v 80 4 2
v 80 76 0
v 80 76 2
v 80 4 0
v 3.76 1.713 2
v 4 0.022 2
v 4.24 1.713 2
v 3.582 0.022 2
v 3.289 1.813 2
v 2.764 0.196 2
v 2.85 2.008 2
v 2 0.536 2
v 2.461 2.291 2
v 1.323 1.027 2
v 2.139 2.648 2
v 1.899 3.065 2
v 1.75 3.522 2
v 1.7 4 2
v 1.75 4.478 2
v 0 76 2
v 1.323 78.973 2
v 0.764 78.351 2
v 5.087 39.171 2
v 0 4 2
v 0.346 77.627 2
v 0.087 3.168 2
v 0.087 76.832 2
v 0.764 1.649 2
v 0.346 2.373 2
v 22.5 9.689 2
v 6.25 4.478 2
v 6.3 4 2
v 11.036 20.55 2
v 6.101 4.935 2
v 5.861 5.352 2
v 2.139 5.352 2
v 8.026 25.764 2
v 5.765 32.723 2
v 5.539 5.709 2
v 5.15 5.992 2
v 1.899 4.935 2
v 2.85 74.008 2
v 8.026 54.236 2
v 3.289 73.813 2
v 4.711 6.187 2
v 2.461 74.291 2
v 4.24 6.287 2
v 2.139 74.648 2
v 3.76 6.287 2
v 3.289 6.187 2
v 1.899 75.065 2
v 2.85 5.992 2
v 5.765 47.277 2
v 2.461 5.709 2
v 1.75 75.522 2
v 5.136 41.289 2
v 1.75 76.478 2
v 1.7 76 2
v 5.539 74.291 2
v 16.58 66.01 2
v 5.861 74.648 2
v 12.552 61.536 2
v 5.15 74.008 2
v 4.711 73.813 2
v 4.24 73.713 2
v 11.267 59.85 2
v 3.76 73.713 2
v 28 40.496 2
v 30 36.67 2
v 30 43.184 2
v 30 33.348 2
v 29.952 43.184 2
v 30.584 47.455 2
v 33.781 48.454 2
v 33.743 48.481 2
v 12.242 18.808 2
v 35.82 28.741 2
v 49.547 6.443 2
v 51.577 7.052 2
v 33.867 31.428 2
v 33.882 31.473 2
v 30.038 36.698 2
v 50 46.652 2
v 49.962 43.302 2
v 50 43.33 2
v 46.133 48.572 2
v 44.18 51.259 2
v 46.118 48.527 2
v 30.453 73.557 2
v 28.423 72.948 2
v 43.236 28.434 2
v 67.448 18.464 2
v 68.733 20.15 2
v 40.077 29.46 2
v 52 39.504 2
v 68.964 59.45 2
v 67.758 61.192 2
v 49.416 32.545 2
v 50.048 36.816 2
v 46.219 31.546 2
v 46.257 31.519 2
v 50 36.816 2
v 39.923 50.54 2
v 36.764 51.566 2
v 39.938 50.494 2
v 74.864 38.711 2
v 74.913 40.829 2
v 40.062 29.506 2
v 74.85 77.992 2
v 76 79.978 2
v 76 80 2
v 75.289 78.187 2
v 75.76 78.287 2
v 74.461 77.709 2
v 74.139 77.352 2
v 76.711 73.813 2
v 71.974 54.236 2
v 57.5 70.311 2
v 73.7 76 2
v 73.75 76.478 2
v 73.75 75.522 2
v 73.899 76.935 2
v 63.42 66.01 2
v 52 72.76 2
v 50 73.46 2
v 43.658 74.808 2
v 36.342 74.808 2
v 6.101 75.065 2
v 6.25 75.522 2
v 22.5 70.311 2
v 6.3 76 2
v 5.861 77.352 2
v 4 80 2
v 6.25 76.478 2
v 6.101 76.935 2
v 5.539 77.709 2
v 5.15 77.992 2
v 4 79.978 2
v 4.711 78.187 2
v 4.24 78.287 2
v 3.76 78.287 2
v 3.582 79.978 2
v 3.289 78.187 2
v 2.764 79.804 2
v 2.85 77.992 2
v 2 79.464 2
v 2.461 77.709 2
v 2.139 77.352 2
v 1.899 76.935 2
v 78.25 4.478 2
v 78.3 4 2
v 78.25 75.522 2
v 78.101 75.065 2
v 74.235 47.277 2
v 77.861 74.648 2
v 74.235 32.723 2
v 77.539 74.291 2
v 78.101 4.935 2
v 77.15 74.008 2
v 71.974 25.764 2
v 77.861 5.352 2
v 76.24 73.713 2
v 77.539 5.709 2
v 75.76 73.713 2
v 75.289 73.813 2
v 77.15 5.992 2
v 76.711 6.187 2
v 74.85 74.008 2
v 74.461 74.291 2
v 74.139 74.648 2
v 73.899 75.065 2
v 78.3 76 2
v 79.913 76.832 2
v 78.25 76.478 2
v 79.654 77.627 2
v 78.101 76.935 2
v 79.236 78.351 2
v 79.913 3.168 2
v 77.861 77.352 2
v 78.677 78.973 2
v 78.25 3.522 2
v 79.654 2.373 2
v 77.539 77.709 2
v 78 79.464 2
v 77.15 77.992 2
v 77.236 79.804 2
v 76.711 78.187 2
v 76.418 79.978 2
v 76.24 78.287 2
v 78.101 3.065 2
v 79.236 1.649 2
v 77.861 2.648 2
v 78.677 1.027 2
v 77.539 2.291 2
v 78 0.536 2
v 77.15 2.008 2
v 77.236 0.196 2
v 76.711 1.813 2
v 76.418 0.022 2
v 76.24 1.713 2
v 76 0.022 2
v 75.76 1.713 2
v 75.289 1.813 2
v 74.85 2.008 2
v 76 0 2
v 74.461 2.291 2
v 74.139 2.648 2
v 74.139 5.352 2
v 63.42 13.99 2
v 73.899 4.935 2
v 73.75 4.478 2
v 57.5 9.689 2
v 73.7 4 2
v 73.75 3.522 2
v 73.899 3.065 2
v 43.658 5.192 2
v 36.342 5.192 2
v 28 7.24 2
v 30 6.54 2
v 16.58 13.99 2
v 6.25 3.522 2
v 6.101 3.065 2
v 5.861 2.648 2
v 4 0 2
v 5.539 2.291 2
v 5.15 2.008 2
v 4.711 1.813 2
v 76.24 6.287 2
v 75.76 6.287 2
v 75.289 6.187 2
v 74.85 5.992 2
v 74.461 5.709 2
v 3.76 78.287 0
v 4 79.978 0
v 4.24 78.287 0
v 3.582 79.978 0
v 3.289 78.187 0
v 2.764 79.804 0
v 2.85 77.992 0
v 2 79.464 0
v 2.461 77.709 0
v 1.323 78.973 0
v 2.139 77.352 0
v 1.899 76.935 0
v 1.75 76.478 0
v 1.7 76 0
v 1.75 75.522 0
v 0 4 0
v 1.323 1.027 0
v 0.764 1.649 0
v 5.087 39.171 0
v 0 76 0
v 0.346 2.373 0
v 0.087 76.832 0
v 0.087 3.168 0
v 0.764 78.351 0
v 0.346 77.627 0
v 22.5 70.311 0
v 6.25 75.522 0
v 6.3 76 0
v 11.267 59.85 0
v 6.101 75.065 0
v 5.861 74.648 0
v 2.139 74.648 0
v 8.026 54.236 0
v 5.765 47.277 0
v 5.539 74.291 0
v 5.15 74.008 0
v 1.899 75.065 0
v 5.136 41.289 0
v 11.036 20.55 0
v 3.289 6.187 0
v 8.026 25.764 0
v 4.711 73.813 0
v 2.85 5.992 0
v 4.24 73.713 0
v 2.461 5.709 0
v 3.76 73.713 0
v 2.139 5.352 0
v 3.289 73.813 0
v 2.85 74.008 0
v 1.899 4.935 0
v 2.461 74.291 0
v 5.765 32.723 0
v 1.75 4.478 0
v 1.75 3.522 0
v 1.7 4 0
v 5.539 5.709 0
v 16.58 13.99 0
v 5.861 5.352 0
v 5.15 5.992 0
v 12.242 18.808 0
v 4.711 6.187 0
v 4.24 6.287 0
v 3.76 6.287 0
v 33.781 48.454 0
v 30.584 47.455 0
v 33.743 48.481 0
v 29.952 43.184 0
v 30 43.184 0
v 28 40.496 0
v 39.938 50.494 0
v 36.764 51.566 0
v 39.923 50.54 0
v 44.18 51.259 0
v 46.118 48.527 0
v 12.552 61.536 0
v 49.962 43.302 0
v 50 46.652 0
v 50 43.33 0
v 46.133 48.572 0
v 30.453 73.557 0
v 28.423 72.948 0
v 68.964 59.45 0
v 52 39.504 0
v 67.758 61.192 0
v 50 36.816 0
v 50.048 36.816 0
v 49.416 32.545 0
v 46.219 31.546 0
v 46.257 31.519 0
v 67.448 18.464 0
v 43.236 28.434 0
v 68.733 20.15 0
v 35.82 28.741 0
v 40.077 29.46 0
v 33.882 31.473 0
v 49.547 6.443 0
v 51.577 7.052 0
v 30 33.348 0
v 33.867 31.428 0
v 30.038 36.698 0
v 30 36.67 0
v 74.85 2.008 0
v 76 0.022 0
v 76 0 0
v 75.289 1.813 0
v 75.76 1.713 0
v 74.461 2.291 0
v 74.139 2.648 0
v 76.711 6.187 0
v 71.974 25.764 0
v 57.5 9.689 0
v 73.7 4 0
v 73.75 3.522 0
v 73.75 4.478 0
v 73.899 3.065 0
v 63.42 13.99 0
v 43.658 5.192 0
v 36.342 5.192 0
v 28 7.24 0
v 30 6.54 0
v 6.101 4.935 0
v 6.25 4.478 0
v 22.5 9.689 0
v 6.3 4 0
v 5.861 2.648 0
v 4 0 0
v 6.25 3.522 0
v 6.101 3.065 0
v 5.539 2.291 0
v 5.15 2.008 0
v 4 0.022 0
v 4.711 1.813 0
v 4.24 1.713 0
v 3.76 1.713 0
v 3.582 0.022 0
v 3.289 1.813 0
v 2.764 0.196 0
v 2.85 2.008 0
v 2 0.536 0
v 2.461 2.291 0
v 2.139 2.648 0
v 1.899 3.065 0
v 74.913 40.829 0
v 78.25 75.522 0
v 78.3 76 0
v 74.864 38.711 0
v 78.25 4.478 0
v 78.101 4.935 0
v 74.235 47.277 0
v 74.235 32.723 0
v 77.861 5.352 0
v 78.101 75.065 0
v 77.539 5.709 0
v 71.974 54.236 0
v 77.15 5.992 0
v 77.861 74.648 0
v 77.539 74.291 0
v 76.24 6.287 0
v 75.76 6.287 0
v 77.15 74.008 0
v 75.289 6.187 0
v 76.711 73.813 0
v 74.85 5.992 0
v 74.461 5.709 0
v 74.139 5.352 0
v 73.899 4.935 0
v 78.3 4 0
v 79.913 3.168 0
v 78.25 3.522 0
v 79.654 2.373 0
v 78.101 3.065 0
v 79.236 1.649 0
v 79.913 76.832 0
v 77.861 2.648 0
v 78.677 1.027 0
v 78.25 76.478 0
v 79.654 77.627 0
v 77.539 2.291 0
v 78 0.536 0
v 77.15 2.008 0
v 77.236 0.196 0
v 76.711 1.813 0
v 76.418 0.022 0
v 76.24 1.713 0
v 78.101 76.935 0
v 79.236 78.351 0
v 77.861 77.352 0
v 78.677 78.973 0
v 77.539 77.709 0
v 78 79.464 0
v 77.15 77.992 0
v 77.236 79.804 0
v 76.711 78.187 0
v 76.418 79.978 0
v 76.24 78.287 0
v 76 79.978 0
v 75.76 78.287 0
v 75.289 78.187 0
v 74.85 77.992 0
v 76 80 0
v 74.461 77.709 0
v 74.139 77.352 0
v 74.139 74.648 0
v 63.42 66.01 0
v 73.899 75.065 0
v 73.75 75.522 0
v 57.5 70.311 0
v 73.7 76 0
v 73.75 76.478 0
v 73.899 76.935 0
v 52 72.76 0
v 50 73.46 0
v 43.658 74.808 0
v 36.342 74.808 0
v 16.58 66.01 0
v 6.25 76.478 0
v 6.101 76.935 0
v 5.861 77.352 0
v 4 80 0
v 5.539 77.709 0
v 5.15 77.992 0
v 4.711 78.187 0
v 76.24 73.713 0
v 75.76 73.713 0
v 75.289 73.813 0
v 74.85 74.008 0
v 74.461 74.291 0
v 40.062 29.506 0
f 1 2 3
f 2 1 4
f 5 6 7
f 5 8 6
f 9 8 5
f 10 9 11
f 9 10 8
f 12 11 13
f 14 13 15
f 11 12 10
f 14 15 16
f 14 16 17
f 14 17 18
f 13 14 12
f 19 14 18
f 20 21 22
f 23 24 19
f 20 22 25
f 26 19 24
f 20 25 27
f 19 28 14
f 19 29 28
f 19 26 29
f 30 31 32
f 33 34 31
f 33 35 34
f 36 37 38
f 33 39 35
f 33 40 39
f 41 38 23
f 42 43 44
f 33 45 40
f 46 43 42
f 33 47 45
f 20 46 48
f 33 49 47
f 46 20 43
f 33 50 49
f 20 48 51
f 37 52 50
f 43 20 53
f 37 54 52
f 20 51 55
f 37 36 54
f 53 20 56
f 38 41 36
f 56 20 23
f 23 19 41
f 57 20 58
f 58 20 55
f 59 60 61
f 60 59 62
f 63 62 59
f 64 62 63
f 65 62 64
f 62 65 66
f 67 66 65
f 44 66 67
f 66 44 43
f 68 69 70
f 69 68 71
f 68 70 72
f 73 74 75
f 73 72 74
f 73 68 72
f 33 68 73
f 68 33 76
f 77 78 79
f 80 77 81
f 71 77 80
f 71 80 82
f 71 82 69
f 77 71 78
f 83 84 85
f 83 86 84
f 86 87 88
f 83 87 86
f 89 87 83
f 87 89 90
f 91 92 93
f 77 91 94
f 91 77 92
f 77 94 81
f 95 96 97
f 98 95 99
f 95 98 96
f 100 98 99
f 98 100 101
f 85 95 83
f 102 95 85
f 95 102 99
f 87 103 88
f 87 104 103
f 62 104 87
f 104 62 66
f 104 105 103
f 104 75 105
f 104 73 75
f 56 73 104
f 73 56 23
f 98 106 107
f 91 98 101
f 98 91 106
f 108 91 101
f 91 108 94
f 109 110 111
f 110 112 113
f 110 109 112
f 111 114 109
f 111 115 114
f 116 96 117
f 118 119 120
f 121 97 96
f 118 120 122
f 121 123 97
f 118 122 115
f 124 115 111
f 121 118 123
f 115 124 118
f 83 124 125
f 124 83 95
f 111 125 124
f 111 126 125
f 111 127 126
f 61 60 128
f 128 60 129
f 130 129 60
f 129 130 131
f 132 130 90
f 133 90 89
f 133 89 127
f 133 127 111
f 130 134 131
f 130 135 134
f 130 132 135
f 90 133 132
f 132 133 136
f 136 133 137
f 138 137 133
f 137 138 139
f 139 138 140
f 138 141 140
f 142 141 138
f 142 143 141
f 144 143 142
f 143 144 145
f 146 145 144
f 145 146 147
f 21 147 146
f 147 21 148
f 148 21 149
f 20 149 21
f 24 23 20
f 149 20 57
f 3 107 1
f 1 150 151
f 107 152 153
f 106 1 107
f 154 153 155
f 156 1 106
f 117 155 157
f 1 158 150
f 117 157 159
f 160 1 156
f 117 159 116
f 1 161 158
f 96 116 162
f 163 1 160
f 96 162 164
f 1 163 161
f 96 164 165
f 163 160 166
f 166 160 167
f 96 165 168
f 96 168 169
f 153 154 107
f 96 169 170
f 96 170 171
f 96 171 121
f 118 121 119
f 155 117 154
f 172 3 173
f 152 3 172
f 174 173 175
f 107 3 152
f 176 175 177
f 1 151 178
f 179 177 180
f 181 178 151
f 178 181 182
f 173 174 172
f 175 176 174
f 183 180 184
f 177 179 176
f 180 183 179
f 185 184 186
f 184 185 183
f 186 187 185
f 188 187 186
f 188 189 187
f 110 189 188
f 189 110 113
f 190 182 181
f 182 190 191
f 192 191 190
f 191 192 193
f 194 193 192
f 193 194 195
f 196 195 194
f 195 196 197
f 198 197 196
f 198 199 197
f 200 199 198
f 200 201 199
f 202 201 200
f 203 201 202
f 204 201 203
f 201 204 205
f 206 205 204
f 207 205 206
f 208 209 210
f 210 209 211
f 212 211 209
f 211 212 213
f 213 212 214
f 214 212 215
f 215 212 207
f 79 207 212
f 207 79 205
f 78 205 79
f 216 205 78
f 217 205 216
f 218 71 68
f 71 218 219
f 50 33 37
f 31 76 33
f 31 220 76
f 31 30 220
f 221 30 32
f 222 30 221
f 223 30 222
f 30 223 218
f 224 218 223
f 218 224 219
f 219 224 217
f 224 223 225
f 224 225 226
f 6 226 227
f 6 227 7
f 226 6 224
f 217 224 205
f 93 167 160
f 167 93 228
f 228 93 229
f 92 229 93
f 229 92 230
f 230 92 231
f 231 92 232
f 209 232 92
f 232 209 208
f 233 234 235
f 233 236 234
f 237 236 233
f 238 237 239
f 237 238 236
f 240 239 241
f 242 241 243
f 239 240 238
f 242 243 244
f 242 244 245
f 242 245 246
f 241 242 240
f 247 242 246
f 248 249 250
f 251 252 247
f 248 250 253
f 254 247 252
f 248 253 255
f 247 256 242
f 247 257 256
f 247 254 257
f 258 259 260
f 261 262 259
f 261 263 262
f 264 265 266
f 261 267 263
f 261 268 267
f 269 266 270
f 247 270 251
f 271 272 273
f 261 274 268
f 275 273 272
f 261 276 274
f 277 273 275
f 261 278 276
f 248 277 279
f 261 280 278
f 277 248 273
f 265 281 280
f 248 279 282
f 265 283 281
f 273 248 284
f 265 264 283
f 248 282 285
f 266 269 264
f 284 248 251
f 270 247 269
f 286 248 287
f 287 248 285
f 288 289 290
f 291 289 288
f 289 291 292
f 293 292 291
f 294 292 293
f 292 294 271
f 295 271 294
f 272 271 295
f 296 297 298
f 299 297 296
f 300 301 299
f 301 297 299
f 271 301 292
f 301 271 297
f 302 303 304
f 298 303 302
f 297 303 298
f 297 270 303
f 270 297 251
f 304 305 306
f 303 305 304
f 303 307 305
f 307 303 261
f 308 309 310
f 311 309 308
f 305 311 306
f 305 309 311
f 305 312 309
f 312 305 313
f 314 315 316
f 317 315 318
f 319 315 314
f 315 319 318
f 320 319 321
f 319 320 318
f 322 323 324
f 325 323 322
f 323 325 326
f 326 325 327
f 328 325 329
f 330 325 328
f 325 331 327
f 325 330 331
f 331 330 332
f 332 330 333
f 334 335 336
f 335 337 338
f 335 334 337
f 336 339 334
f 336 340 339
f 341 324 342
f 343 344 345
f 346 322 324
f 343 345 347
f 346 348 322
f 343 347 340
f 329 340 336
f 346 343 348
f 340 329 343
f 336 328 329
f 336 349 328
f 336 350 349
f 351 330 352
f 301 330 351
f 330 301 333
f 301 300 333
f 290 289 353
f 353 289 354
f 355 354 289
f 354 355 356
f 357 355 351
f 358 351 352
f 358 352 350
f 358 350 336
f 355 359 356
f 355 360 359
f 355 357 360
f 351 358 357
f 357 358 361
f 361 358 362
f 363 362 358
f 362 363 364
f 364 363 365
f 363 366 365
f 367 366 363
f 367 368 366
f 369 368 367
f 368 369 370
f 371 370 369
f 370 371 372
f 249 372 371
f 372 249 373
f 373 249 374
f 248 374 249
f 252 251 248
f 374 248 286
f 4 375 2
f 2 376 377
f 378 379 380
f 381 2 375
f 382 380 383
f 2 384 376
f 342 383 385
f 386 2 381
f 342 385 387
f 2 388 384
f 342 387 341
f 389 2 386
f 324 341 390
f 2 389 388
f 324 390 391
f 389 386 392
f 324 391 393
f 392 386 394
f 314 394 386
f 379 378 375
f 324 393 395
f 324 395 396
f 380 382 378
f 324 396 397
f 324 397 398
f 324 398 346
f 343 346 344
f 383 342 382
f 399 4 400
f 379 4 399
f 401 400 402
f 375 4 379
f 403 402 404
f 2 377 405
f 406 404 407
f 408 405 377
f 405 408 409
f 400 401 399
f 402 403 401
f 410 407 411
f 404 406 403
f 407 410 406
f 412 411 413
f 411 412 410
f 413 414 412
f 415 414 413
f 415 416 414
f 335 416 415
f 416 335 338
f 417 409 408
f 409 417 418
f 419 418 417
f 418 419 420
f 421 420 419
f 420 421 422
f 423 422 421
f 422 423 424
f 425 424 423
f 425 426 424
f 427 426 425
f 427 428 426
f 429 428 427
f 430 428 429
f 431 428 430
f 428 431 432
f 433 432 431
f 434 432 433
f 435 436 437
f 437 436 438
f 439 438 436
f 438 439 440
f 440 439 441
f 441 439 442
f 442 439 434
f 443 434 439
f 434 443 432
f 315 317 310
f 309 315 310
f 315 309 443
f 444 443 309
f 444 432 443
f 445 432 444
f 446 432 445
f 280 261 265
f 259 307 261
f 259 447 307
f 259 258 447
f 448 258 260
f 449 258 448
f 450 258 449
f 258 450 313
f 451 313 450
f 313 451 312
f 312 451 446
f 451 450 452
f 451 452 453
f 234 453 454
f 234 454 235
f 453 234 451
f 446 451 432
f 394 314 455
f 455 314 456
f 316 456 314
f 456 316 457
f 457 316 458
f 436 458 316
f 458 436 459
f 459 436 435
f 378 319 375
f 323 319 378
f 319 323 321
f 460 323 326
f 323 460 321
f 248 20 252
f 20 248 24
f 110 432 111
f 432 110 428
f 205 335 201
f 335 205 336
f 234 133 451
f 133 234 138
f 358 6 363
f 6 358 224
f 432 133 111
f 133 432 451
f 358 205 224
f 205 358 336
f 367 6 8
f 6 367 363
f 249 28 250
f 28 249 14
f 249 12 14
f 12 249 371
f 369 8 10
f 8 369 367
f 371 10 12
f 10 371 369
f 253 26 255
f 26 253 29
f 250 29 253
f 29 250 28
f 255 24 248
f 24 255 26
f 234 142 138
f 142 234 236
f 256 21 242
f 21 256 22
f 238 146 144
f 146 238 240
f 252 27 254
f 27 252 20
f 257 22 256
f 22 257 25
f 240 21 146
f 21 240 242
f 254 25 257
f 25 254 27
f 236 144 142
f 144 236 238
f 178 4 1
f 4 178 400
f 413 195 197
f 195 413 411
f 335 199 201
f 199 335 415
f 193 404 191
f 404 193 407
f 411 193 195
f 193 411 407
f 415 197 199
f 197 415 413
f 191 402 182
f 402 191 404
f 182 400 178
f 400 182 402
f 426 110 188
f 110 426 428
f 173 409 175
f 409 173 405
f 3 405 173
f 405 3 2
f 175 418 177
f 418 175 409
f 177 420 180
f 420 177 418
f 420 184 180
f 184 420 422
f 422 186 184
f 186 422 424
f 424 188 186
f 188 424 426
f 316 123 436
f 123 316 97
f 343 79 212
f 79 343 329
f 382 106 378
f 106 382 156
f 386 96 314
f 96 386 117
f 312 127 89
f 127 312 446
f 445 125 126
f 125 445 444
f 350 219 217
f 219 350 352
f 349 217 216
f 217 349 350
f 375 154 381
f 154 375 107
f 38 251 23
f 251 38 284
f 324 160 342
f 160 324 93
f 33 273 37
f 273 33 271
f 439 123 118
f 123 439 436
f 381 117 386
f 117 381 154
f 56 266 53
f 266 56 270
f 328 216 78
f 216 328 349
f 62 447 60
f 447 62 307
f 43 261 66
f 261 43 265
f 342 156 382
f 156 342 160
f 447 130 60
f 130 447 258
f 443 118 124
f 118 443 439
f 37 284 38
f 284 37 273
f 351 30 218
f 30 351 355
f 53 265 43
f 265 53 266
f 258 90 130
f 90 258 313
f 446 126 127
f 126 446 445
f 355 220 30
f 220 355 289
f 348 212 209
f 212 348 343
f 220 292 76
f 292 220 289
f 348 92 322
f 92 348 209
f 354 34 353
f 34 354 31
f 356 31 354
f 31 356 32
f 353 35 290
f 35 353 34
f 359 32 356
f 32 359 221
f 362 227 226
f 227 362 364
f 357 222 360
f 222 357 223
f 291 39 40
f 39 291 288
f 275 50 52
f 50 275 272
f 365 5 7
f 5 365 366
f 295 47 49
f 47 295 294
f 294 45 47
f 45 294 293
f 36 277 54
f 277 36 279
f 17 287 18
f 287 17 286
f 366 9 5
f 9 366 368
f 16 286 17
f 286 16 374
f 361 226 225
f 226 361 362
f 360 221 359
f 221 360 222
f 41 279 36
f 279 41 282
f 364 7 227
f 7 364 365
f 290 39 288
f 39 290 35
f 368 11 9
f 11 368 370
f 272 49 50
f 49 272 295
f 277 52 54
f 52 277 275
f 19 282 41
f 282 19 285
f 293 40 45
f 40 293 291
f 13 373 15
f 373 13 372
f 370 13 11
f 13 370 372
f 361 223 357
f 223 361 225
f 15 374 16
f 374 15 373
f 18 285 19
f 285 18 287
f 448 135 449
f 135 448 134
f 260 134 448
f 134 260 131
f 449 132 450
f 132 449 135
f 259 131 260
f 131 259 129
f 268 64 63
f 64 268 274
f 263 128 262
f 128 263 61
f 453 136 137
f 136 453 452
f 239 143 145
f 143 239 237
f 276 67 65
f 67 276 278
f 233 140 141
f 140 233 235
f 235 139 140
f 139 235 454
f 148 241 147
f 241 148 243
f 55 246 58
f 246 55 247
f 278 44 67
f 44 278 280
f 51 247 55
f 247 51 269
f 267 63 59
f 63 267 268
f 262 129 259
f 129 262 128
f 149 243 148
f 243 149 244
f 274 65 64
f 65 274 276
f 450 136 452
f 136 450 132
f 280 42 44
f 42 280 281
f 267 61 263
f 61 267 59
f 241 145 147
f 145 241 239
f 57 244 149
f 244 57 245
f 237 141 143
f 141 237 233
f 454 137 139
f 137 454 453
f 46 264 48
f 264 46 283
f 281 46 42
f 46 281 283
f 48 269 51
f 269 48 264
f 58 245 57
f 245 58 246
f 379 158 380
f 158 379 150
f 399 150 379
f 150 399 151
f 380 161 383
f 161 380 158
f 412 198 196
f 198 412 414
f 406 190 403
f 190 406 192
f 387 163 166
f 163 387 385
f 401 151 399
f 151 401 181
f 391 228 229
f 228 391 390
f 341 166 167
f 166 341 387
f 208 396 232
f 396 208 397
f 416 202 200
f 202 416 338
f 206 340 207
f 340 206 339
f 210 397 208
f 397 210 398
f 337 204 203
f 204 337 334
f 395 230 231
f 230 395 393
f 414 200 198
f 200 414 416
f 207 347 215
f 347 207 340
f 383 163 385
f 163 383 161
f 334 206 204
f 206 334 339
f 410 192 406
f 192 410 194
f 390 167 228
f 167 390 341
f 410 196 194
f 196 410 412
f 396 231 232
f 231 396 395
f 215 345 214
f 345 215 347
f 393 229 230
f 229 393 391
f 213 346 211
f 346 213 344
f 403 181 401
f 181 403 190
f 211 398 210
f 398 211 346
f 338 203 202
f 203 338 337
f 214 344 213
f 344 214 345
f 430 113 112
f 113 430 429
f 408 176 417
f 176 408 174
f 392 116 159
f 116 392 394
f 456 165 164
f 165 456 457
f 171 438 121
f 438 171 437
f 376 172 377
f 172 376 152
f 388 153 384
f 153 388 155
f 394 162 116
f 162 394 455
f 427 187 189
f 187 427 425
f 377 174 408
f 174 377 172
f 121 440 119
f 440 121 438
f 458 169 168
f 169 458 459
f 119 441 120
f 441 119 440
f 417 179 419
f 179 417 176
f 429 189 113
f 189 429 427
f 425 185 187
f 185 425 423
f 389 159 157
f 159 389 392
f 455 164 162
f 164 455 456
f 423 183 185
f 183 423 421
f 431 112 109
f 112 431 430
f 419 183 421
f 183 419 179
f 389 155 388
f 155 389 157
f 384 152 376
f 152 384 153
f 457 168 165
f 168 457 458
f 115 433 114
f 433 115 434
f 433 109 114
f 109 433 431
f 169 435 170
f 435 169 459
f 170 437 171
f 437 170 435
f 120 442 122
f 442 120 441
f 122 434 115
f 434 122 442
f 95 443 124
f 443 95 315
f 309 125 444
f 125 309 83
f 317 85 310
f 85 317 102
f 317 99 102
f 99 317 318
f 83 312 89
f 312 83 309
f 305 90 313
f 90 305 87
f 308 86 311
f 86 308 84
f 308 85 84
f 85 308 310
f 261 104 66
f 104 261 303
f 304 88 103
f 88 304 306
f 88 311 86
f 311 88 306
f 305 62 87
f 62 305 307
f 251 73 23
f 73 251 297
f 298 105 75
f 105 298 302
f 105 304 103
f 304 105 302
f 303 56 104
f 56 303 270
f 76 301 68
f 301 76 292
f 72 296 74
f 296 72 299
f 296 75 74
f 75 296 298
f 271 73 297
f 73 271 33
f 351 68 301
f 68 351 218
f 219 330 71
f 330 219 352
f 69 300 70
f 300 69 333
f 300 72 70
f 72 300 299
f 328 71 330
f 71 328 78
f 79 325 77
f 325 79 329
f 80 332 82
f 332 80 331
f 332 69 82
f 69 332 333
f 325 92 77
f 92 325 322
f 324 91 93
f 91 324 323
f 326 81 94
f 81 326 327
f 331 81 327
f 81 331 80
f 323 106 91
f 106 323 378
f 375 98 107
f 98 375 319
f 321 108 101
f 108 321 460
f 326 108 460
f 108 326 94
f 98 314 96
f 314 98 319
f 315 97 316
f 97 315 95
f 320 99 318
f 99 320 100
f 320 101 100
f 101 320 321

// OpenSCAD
$fn =30;

/* [Body Parameters] */
// Fan Size
size=80;
// Border Width
borderthickness=5;
// Corner Radius 
cornerradius=4;
// Sheet Thickness 
thickness=2;

/* [Screw Hole Parameters] */
// Screw Radius 
screwradius=2.3;
// Screw Inset From Corder
screwinset=4;

/* [Spine Parameters] */
// Number of Spines
spines=10;
// Spine Thickness
spinesize=2;
// Spine Offset from center
spineoffset=10;
// Spine Extra Rotation
spinerotation=0;

/* [Hidden] */
dxf=false;
// Below are not parameters //

// Calculate helper variables
holeradius=size/2-borderthickness;

// Create the grill
if (dxf)
	projection(cut=false) fan_grill();
else
	fan_grill();

module fan_grill()
{
	union()
	{
		difference()
		{
			body();

			// hole
			translate([size/2,size/2,-thickness/4]) cylinder(r=holeradius,h=thickness*2);

			// screws
			translate([screwinset,screwinset,0]) cylinder(r=screwradius,h=thickness);
			translate([screwinset,size-screwinset,0]) cylinder(r=screwradius,h=thickness);
			translate([size-screwinset,screwinset,0]) cylinder(r=screwradius,h=thickness);
			translate([size-screwinset,size-screwinset,0]) cylinder(r=screwradius,h=thickness);
		}
		translate([size/2,size/2,0])
		interrior();
	}
}

module body()
{
	union()
	{
		translate([0,cornerradius,0]) cube(size=[size,size-(cornerradius*2),thickness]);
		translate([cornerradius,0,0]) cube(size=[size-(cornerradius*2),size,thickness]);
		translate([cornerradius,cornerradius,0]) cylinder(r=cornerradius,h=thickness);
		translate([cornerradius,size-cornerradius,0]) cylinder(r=cornerradius,h=thickness);
		translate([size-cornerradius,cornerradius,0]) cylinder(r=cornerradius,h=thickness);
		translate([size-cornerradius,size-cornerradius,0]) cylinder(r=cornerradius,h=thickness);
	}
}

module interrior()
{
	for(i=[0:spines-1])
	{
		  rotate(a=[0,0,i*(360.0/spines)+spinerotation]) 
		  translate([spineoffset,-spineoffset/3.141,0])
		  cube([spinesize,holeradius+(spineoffset/3.141),spinesize]);
	}
}
